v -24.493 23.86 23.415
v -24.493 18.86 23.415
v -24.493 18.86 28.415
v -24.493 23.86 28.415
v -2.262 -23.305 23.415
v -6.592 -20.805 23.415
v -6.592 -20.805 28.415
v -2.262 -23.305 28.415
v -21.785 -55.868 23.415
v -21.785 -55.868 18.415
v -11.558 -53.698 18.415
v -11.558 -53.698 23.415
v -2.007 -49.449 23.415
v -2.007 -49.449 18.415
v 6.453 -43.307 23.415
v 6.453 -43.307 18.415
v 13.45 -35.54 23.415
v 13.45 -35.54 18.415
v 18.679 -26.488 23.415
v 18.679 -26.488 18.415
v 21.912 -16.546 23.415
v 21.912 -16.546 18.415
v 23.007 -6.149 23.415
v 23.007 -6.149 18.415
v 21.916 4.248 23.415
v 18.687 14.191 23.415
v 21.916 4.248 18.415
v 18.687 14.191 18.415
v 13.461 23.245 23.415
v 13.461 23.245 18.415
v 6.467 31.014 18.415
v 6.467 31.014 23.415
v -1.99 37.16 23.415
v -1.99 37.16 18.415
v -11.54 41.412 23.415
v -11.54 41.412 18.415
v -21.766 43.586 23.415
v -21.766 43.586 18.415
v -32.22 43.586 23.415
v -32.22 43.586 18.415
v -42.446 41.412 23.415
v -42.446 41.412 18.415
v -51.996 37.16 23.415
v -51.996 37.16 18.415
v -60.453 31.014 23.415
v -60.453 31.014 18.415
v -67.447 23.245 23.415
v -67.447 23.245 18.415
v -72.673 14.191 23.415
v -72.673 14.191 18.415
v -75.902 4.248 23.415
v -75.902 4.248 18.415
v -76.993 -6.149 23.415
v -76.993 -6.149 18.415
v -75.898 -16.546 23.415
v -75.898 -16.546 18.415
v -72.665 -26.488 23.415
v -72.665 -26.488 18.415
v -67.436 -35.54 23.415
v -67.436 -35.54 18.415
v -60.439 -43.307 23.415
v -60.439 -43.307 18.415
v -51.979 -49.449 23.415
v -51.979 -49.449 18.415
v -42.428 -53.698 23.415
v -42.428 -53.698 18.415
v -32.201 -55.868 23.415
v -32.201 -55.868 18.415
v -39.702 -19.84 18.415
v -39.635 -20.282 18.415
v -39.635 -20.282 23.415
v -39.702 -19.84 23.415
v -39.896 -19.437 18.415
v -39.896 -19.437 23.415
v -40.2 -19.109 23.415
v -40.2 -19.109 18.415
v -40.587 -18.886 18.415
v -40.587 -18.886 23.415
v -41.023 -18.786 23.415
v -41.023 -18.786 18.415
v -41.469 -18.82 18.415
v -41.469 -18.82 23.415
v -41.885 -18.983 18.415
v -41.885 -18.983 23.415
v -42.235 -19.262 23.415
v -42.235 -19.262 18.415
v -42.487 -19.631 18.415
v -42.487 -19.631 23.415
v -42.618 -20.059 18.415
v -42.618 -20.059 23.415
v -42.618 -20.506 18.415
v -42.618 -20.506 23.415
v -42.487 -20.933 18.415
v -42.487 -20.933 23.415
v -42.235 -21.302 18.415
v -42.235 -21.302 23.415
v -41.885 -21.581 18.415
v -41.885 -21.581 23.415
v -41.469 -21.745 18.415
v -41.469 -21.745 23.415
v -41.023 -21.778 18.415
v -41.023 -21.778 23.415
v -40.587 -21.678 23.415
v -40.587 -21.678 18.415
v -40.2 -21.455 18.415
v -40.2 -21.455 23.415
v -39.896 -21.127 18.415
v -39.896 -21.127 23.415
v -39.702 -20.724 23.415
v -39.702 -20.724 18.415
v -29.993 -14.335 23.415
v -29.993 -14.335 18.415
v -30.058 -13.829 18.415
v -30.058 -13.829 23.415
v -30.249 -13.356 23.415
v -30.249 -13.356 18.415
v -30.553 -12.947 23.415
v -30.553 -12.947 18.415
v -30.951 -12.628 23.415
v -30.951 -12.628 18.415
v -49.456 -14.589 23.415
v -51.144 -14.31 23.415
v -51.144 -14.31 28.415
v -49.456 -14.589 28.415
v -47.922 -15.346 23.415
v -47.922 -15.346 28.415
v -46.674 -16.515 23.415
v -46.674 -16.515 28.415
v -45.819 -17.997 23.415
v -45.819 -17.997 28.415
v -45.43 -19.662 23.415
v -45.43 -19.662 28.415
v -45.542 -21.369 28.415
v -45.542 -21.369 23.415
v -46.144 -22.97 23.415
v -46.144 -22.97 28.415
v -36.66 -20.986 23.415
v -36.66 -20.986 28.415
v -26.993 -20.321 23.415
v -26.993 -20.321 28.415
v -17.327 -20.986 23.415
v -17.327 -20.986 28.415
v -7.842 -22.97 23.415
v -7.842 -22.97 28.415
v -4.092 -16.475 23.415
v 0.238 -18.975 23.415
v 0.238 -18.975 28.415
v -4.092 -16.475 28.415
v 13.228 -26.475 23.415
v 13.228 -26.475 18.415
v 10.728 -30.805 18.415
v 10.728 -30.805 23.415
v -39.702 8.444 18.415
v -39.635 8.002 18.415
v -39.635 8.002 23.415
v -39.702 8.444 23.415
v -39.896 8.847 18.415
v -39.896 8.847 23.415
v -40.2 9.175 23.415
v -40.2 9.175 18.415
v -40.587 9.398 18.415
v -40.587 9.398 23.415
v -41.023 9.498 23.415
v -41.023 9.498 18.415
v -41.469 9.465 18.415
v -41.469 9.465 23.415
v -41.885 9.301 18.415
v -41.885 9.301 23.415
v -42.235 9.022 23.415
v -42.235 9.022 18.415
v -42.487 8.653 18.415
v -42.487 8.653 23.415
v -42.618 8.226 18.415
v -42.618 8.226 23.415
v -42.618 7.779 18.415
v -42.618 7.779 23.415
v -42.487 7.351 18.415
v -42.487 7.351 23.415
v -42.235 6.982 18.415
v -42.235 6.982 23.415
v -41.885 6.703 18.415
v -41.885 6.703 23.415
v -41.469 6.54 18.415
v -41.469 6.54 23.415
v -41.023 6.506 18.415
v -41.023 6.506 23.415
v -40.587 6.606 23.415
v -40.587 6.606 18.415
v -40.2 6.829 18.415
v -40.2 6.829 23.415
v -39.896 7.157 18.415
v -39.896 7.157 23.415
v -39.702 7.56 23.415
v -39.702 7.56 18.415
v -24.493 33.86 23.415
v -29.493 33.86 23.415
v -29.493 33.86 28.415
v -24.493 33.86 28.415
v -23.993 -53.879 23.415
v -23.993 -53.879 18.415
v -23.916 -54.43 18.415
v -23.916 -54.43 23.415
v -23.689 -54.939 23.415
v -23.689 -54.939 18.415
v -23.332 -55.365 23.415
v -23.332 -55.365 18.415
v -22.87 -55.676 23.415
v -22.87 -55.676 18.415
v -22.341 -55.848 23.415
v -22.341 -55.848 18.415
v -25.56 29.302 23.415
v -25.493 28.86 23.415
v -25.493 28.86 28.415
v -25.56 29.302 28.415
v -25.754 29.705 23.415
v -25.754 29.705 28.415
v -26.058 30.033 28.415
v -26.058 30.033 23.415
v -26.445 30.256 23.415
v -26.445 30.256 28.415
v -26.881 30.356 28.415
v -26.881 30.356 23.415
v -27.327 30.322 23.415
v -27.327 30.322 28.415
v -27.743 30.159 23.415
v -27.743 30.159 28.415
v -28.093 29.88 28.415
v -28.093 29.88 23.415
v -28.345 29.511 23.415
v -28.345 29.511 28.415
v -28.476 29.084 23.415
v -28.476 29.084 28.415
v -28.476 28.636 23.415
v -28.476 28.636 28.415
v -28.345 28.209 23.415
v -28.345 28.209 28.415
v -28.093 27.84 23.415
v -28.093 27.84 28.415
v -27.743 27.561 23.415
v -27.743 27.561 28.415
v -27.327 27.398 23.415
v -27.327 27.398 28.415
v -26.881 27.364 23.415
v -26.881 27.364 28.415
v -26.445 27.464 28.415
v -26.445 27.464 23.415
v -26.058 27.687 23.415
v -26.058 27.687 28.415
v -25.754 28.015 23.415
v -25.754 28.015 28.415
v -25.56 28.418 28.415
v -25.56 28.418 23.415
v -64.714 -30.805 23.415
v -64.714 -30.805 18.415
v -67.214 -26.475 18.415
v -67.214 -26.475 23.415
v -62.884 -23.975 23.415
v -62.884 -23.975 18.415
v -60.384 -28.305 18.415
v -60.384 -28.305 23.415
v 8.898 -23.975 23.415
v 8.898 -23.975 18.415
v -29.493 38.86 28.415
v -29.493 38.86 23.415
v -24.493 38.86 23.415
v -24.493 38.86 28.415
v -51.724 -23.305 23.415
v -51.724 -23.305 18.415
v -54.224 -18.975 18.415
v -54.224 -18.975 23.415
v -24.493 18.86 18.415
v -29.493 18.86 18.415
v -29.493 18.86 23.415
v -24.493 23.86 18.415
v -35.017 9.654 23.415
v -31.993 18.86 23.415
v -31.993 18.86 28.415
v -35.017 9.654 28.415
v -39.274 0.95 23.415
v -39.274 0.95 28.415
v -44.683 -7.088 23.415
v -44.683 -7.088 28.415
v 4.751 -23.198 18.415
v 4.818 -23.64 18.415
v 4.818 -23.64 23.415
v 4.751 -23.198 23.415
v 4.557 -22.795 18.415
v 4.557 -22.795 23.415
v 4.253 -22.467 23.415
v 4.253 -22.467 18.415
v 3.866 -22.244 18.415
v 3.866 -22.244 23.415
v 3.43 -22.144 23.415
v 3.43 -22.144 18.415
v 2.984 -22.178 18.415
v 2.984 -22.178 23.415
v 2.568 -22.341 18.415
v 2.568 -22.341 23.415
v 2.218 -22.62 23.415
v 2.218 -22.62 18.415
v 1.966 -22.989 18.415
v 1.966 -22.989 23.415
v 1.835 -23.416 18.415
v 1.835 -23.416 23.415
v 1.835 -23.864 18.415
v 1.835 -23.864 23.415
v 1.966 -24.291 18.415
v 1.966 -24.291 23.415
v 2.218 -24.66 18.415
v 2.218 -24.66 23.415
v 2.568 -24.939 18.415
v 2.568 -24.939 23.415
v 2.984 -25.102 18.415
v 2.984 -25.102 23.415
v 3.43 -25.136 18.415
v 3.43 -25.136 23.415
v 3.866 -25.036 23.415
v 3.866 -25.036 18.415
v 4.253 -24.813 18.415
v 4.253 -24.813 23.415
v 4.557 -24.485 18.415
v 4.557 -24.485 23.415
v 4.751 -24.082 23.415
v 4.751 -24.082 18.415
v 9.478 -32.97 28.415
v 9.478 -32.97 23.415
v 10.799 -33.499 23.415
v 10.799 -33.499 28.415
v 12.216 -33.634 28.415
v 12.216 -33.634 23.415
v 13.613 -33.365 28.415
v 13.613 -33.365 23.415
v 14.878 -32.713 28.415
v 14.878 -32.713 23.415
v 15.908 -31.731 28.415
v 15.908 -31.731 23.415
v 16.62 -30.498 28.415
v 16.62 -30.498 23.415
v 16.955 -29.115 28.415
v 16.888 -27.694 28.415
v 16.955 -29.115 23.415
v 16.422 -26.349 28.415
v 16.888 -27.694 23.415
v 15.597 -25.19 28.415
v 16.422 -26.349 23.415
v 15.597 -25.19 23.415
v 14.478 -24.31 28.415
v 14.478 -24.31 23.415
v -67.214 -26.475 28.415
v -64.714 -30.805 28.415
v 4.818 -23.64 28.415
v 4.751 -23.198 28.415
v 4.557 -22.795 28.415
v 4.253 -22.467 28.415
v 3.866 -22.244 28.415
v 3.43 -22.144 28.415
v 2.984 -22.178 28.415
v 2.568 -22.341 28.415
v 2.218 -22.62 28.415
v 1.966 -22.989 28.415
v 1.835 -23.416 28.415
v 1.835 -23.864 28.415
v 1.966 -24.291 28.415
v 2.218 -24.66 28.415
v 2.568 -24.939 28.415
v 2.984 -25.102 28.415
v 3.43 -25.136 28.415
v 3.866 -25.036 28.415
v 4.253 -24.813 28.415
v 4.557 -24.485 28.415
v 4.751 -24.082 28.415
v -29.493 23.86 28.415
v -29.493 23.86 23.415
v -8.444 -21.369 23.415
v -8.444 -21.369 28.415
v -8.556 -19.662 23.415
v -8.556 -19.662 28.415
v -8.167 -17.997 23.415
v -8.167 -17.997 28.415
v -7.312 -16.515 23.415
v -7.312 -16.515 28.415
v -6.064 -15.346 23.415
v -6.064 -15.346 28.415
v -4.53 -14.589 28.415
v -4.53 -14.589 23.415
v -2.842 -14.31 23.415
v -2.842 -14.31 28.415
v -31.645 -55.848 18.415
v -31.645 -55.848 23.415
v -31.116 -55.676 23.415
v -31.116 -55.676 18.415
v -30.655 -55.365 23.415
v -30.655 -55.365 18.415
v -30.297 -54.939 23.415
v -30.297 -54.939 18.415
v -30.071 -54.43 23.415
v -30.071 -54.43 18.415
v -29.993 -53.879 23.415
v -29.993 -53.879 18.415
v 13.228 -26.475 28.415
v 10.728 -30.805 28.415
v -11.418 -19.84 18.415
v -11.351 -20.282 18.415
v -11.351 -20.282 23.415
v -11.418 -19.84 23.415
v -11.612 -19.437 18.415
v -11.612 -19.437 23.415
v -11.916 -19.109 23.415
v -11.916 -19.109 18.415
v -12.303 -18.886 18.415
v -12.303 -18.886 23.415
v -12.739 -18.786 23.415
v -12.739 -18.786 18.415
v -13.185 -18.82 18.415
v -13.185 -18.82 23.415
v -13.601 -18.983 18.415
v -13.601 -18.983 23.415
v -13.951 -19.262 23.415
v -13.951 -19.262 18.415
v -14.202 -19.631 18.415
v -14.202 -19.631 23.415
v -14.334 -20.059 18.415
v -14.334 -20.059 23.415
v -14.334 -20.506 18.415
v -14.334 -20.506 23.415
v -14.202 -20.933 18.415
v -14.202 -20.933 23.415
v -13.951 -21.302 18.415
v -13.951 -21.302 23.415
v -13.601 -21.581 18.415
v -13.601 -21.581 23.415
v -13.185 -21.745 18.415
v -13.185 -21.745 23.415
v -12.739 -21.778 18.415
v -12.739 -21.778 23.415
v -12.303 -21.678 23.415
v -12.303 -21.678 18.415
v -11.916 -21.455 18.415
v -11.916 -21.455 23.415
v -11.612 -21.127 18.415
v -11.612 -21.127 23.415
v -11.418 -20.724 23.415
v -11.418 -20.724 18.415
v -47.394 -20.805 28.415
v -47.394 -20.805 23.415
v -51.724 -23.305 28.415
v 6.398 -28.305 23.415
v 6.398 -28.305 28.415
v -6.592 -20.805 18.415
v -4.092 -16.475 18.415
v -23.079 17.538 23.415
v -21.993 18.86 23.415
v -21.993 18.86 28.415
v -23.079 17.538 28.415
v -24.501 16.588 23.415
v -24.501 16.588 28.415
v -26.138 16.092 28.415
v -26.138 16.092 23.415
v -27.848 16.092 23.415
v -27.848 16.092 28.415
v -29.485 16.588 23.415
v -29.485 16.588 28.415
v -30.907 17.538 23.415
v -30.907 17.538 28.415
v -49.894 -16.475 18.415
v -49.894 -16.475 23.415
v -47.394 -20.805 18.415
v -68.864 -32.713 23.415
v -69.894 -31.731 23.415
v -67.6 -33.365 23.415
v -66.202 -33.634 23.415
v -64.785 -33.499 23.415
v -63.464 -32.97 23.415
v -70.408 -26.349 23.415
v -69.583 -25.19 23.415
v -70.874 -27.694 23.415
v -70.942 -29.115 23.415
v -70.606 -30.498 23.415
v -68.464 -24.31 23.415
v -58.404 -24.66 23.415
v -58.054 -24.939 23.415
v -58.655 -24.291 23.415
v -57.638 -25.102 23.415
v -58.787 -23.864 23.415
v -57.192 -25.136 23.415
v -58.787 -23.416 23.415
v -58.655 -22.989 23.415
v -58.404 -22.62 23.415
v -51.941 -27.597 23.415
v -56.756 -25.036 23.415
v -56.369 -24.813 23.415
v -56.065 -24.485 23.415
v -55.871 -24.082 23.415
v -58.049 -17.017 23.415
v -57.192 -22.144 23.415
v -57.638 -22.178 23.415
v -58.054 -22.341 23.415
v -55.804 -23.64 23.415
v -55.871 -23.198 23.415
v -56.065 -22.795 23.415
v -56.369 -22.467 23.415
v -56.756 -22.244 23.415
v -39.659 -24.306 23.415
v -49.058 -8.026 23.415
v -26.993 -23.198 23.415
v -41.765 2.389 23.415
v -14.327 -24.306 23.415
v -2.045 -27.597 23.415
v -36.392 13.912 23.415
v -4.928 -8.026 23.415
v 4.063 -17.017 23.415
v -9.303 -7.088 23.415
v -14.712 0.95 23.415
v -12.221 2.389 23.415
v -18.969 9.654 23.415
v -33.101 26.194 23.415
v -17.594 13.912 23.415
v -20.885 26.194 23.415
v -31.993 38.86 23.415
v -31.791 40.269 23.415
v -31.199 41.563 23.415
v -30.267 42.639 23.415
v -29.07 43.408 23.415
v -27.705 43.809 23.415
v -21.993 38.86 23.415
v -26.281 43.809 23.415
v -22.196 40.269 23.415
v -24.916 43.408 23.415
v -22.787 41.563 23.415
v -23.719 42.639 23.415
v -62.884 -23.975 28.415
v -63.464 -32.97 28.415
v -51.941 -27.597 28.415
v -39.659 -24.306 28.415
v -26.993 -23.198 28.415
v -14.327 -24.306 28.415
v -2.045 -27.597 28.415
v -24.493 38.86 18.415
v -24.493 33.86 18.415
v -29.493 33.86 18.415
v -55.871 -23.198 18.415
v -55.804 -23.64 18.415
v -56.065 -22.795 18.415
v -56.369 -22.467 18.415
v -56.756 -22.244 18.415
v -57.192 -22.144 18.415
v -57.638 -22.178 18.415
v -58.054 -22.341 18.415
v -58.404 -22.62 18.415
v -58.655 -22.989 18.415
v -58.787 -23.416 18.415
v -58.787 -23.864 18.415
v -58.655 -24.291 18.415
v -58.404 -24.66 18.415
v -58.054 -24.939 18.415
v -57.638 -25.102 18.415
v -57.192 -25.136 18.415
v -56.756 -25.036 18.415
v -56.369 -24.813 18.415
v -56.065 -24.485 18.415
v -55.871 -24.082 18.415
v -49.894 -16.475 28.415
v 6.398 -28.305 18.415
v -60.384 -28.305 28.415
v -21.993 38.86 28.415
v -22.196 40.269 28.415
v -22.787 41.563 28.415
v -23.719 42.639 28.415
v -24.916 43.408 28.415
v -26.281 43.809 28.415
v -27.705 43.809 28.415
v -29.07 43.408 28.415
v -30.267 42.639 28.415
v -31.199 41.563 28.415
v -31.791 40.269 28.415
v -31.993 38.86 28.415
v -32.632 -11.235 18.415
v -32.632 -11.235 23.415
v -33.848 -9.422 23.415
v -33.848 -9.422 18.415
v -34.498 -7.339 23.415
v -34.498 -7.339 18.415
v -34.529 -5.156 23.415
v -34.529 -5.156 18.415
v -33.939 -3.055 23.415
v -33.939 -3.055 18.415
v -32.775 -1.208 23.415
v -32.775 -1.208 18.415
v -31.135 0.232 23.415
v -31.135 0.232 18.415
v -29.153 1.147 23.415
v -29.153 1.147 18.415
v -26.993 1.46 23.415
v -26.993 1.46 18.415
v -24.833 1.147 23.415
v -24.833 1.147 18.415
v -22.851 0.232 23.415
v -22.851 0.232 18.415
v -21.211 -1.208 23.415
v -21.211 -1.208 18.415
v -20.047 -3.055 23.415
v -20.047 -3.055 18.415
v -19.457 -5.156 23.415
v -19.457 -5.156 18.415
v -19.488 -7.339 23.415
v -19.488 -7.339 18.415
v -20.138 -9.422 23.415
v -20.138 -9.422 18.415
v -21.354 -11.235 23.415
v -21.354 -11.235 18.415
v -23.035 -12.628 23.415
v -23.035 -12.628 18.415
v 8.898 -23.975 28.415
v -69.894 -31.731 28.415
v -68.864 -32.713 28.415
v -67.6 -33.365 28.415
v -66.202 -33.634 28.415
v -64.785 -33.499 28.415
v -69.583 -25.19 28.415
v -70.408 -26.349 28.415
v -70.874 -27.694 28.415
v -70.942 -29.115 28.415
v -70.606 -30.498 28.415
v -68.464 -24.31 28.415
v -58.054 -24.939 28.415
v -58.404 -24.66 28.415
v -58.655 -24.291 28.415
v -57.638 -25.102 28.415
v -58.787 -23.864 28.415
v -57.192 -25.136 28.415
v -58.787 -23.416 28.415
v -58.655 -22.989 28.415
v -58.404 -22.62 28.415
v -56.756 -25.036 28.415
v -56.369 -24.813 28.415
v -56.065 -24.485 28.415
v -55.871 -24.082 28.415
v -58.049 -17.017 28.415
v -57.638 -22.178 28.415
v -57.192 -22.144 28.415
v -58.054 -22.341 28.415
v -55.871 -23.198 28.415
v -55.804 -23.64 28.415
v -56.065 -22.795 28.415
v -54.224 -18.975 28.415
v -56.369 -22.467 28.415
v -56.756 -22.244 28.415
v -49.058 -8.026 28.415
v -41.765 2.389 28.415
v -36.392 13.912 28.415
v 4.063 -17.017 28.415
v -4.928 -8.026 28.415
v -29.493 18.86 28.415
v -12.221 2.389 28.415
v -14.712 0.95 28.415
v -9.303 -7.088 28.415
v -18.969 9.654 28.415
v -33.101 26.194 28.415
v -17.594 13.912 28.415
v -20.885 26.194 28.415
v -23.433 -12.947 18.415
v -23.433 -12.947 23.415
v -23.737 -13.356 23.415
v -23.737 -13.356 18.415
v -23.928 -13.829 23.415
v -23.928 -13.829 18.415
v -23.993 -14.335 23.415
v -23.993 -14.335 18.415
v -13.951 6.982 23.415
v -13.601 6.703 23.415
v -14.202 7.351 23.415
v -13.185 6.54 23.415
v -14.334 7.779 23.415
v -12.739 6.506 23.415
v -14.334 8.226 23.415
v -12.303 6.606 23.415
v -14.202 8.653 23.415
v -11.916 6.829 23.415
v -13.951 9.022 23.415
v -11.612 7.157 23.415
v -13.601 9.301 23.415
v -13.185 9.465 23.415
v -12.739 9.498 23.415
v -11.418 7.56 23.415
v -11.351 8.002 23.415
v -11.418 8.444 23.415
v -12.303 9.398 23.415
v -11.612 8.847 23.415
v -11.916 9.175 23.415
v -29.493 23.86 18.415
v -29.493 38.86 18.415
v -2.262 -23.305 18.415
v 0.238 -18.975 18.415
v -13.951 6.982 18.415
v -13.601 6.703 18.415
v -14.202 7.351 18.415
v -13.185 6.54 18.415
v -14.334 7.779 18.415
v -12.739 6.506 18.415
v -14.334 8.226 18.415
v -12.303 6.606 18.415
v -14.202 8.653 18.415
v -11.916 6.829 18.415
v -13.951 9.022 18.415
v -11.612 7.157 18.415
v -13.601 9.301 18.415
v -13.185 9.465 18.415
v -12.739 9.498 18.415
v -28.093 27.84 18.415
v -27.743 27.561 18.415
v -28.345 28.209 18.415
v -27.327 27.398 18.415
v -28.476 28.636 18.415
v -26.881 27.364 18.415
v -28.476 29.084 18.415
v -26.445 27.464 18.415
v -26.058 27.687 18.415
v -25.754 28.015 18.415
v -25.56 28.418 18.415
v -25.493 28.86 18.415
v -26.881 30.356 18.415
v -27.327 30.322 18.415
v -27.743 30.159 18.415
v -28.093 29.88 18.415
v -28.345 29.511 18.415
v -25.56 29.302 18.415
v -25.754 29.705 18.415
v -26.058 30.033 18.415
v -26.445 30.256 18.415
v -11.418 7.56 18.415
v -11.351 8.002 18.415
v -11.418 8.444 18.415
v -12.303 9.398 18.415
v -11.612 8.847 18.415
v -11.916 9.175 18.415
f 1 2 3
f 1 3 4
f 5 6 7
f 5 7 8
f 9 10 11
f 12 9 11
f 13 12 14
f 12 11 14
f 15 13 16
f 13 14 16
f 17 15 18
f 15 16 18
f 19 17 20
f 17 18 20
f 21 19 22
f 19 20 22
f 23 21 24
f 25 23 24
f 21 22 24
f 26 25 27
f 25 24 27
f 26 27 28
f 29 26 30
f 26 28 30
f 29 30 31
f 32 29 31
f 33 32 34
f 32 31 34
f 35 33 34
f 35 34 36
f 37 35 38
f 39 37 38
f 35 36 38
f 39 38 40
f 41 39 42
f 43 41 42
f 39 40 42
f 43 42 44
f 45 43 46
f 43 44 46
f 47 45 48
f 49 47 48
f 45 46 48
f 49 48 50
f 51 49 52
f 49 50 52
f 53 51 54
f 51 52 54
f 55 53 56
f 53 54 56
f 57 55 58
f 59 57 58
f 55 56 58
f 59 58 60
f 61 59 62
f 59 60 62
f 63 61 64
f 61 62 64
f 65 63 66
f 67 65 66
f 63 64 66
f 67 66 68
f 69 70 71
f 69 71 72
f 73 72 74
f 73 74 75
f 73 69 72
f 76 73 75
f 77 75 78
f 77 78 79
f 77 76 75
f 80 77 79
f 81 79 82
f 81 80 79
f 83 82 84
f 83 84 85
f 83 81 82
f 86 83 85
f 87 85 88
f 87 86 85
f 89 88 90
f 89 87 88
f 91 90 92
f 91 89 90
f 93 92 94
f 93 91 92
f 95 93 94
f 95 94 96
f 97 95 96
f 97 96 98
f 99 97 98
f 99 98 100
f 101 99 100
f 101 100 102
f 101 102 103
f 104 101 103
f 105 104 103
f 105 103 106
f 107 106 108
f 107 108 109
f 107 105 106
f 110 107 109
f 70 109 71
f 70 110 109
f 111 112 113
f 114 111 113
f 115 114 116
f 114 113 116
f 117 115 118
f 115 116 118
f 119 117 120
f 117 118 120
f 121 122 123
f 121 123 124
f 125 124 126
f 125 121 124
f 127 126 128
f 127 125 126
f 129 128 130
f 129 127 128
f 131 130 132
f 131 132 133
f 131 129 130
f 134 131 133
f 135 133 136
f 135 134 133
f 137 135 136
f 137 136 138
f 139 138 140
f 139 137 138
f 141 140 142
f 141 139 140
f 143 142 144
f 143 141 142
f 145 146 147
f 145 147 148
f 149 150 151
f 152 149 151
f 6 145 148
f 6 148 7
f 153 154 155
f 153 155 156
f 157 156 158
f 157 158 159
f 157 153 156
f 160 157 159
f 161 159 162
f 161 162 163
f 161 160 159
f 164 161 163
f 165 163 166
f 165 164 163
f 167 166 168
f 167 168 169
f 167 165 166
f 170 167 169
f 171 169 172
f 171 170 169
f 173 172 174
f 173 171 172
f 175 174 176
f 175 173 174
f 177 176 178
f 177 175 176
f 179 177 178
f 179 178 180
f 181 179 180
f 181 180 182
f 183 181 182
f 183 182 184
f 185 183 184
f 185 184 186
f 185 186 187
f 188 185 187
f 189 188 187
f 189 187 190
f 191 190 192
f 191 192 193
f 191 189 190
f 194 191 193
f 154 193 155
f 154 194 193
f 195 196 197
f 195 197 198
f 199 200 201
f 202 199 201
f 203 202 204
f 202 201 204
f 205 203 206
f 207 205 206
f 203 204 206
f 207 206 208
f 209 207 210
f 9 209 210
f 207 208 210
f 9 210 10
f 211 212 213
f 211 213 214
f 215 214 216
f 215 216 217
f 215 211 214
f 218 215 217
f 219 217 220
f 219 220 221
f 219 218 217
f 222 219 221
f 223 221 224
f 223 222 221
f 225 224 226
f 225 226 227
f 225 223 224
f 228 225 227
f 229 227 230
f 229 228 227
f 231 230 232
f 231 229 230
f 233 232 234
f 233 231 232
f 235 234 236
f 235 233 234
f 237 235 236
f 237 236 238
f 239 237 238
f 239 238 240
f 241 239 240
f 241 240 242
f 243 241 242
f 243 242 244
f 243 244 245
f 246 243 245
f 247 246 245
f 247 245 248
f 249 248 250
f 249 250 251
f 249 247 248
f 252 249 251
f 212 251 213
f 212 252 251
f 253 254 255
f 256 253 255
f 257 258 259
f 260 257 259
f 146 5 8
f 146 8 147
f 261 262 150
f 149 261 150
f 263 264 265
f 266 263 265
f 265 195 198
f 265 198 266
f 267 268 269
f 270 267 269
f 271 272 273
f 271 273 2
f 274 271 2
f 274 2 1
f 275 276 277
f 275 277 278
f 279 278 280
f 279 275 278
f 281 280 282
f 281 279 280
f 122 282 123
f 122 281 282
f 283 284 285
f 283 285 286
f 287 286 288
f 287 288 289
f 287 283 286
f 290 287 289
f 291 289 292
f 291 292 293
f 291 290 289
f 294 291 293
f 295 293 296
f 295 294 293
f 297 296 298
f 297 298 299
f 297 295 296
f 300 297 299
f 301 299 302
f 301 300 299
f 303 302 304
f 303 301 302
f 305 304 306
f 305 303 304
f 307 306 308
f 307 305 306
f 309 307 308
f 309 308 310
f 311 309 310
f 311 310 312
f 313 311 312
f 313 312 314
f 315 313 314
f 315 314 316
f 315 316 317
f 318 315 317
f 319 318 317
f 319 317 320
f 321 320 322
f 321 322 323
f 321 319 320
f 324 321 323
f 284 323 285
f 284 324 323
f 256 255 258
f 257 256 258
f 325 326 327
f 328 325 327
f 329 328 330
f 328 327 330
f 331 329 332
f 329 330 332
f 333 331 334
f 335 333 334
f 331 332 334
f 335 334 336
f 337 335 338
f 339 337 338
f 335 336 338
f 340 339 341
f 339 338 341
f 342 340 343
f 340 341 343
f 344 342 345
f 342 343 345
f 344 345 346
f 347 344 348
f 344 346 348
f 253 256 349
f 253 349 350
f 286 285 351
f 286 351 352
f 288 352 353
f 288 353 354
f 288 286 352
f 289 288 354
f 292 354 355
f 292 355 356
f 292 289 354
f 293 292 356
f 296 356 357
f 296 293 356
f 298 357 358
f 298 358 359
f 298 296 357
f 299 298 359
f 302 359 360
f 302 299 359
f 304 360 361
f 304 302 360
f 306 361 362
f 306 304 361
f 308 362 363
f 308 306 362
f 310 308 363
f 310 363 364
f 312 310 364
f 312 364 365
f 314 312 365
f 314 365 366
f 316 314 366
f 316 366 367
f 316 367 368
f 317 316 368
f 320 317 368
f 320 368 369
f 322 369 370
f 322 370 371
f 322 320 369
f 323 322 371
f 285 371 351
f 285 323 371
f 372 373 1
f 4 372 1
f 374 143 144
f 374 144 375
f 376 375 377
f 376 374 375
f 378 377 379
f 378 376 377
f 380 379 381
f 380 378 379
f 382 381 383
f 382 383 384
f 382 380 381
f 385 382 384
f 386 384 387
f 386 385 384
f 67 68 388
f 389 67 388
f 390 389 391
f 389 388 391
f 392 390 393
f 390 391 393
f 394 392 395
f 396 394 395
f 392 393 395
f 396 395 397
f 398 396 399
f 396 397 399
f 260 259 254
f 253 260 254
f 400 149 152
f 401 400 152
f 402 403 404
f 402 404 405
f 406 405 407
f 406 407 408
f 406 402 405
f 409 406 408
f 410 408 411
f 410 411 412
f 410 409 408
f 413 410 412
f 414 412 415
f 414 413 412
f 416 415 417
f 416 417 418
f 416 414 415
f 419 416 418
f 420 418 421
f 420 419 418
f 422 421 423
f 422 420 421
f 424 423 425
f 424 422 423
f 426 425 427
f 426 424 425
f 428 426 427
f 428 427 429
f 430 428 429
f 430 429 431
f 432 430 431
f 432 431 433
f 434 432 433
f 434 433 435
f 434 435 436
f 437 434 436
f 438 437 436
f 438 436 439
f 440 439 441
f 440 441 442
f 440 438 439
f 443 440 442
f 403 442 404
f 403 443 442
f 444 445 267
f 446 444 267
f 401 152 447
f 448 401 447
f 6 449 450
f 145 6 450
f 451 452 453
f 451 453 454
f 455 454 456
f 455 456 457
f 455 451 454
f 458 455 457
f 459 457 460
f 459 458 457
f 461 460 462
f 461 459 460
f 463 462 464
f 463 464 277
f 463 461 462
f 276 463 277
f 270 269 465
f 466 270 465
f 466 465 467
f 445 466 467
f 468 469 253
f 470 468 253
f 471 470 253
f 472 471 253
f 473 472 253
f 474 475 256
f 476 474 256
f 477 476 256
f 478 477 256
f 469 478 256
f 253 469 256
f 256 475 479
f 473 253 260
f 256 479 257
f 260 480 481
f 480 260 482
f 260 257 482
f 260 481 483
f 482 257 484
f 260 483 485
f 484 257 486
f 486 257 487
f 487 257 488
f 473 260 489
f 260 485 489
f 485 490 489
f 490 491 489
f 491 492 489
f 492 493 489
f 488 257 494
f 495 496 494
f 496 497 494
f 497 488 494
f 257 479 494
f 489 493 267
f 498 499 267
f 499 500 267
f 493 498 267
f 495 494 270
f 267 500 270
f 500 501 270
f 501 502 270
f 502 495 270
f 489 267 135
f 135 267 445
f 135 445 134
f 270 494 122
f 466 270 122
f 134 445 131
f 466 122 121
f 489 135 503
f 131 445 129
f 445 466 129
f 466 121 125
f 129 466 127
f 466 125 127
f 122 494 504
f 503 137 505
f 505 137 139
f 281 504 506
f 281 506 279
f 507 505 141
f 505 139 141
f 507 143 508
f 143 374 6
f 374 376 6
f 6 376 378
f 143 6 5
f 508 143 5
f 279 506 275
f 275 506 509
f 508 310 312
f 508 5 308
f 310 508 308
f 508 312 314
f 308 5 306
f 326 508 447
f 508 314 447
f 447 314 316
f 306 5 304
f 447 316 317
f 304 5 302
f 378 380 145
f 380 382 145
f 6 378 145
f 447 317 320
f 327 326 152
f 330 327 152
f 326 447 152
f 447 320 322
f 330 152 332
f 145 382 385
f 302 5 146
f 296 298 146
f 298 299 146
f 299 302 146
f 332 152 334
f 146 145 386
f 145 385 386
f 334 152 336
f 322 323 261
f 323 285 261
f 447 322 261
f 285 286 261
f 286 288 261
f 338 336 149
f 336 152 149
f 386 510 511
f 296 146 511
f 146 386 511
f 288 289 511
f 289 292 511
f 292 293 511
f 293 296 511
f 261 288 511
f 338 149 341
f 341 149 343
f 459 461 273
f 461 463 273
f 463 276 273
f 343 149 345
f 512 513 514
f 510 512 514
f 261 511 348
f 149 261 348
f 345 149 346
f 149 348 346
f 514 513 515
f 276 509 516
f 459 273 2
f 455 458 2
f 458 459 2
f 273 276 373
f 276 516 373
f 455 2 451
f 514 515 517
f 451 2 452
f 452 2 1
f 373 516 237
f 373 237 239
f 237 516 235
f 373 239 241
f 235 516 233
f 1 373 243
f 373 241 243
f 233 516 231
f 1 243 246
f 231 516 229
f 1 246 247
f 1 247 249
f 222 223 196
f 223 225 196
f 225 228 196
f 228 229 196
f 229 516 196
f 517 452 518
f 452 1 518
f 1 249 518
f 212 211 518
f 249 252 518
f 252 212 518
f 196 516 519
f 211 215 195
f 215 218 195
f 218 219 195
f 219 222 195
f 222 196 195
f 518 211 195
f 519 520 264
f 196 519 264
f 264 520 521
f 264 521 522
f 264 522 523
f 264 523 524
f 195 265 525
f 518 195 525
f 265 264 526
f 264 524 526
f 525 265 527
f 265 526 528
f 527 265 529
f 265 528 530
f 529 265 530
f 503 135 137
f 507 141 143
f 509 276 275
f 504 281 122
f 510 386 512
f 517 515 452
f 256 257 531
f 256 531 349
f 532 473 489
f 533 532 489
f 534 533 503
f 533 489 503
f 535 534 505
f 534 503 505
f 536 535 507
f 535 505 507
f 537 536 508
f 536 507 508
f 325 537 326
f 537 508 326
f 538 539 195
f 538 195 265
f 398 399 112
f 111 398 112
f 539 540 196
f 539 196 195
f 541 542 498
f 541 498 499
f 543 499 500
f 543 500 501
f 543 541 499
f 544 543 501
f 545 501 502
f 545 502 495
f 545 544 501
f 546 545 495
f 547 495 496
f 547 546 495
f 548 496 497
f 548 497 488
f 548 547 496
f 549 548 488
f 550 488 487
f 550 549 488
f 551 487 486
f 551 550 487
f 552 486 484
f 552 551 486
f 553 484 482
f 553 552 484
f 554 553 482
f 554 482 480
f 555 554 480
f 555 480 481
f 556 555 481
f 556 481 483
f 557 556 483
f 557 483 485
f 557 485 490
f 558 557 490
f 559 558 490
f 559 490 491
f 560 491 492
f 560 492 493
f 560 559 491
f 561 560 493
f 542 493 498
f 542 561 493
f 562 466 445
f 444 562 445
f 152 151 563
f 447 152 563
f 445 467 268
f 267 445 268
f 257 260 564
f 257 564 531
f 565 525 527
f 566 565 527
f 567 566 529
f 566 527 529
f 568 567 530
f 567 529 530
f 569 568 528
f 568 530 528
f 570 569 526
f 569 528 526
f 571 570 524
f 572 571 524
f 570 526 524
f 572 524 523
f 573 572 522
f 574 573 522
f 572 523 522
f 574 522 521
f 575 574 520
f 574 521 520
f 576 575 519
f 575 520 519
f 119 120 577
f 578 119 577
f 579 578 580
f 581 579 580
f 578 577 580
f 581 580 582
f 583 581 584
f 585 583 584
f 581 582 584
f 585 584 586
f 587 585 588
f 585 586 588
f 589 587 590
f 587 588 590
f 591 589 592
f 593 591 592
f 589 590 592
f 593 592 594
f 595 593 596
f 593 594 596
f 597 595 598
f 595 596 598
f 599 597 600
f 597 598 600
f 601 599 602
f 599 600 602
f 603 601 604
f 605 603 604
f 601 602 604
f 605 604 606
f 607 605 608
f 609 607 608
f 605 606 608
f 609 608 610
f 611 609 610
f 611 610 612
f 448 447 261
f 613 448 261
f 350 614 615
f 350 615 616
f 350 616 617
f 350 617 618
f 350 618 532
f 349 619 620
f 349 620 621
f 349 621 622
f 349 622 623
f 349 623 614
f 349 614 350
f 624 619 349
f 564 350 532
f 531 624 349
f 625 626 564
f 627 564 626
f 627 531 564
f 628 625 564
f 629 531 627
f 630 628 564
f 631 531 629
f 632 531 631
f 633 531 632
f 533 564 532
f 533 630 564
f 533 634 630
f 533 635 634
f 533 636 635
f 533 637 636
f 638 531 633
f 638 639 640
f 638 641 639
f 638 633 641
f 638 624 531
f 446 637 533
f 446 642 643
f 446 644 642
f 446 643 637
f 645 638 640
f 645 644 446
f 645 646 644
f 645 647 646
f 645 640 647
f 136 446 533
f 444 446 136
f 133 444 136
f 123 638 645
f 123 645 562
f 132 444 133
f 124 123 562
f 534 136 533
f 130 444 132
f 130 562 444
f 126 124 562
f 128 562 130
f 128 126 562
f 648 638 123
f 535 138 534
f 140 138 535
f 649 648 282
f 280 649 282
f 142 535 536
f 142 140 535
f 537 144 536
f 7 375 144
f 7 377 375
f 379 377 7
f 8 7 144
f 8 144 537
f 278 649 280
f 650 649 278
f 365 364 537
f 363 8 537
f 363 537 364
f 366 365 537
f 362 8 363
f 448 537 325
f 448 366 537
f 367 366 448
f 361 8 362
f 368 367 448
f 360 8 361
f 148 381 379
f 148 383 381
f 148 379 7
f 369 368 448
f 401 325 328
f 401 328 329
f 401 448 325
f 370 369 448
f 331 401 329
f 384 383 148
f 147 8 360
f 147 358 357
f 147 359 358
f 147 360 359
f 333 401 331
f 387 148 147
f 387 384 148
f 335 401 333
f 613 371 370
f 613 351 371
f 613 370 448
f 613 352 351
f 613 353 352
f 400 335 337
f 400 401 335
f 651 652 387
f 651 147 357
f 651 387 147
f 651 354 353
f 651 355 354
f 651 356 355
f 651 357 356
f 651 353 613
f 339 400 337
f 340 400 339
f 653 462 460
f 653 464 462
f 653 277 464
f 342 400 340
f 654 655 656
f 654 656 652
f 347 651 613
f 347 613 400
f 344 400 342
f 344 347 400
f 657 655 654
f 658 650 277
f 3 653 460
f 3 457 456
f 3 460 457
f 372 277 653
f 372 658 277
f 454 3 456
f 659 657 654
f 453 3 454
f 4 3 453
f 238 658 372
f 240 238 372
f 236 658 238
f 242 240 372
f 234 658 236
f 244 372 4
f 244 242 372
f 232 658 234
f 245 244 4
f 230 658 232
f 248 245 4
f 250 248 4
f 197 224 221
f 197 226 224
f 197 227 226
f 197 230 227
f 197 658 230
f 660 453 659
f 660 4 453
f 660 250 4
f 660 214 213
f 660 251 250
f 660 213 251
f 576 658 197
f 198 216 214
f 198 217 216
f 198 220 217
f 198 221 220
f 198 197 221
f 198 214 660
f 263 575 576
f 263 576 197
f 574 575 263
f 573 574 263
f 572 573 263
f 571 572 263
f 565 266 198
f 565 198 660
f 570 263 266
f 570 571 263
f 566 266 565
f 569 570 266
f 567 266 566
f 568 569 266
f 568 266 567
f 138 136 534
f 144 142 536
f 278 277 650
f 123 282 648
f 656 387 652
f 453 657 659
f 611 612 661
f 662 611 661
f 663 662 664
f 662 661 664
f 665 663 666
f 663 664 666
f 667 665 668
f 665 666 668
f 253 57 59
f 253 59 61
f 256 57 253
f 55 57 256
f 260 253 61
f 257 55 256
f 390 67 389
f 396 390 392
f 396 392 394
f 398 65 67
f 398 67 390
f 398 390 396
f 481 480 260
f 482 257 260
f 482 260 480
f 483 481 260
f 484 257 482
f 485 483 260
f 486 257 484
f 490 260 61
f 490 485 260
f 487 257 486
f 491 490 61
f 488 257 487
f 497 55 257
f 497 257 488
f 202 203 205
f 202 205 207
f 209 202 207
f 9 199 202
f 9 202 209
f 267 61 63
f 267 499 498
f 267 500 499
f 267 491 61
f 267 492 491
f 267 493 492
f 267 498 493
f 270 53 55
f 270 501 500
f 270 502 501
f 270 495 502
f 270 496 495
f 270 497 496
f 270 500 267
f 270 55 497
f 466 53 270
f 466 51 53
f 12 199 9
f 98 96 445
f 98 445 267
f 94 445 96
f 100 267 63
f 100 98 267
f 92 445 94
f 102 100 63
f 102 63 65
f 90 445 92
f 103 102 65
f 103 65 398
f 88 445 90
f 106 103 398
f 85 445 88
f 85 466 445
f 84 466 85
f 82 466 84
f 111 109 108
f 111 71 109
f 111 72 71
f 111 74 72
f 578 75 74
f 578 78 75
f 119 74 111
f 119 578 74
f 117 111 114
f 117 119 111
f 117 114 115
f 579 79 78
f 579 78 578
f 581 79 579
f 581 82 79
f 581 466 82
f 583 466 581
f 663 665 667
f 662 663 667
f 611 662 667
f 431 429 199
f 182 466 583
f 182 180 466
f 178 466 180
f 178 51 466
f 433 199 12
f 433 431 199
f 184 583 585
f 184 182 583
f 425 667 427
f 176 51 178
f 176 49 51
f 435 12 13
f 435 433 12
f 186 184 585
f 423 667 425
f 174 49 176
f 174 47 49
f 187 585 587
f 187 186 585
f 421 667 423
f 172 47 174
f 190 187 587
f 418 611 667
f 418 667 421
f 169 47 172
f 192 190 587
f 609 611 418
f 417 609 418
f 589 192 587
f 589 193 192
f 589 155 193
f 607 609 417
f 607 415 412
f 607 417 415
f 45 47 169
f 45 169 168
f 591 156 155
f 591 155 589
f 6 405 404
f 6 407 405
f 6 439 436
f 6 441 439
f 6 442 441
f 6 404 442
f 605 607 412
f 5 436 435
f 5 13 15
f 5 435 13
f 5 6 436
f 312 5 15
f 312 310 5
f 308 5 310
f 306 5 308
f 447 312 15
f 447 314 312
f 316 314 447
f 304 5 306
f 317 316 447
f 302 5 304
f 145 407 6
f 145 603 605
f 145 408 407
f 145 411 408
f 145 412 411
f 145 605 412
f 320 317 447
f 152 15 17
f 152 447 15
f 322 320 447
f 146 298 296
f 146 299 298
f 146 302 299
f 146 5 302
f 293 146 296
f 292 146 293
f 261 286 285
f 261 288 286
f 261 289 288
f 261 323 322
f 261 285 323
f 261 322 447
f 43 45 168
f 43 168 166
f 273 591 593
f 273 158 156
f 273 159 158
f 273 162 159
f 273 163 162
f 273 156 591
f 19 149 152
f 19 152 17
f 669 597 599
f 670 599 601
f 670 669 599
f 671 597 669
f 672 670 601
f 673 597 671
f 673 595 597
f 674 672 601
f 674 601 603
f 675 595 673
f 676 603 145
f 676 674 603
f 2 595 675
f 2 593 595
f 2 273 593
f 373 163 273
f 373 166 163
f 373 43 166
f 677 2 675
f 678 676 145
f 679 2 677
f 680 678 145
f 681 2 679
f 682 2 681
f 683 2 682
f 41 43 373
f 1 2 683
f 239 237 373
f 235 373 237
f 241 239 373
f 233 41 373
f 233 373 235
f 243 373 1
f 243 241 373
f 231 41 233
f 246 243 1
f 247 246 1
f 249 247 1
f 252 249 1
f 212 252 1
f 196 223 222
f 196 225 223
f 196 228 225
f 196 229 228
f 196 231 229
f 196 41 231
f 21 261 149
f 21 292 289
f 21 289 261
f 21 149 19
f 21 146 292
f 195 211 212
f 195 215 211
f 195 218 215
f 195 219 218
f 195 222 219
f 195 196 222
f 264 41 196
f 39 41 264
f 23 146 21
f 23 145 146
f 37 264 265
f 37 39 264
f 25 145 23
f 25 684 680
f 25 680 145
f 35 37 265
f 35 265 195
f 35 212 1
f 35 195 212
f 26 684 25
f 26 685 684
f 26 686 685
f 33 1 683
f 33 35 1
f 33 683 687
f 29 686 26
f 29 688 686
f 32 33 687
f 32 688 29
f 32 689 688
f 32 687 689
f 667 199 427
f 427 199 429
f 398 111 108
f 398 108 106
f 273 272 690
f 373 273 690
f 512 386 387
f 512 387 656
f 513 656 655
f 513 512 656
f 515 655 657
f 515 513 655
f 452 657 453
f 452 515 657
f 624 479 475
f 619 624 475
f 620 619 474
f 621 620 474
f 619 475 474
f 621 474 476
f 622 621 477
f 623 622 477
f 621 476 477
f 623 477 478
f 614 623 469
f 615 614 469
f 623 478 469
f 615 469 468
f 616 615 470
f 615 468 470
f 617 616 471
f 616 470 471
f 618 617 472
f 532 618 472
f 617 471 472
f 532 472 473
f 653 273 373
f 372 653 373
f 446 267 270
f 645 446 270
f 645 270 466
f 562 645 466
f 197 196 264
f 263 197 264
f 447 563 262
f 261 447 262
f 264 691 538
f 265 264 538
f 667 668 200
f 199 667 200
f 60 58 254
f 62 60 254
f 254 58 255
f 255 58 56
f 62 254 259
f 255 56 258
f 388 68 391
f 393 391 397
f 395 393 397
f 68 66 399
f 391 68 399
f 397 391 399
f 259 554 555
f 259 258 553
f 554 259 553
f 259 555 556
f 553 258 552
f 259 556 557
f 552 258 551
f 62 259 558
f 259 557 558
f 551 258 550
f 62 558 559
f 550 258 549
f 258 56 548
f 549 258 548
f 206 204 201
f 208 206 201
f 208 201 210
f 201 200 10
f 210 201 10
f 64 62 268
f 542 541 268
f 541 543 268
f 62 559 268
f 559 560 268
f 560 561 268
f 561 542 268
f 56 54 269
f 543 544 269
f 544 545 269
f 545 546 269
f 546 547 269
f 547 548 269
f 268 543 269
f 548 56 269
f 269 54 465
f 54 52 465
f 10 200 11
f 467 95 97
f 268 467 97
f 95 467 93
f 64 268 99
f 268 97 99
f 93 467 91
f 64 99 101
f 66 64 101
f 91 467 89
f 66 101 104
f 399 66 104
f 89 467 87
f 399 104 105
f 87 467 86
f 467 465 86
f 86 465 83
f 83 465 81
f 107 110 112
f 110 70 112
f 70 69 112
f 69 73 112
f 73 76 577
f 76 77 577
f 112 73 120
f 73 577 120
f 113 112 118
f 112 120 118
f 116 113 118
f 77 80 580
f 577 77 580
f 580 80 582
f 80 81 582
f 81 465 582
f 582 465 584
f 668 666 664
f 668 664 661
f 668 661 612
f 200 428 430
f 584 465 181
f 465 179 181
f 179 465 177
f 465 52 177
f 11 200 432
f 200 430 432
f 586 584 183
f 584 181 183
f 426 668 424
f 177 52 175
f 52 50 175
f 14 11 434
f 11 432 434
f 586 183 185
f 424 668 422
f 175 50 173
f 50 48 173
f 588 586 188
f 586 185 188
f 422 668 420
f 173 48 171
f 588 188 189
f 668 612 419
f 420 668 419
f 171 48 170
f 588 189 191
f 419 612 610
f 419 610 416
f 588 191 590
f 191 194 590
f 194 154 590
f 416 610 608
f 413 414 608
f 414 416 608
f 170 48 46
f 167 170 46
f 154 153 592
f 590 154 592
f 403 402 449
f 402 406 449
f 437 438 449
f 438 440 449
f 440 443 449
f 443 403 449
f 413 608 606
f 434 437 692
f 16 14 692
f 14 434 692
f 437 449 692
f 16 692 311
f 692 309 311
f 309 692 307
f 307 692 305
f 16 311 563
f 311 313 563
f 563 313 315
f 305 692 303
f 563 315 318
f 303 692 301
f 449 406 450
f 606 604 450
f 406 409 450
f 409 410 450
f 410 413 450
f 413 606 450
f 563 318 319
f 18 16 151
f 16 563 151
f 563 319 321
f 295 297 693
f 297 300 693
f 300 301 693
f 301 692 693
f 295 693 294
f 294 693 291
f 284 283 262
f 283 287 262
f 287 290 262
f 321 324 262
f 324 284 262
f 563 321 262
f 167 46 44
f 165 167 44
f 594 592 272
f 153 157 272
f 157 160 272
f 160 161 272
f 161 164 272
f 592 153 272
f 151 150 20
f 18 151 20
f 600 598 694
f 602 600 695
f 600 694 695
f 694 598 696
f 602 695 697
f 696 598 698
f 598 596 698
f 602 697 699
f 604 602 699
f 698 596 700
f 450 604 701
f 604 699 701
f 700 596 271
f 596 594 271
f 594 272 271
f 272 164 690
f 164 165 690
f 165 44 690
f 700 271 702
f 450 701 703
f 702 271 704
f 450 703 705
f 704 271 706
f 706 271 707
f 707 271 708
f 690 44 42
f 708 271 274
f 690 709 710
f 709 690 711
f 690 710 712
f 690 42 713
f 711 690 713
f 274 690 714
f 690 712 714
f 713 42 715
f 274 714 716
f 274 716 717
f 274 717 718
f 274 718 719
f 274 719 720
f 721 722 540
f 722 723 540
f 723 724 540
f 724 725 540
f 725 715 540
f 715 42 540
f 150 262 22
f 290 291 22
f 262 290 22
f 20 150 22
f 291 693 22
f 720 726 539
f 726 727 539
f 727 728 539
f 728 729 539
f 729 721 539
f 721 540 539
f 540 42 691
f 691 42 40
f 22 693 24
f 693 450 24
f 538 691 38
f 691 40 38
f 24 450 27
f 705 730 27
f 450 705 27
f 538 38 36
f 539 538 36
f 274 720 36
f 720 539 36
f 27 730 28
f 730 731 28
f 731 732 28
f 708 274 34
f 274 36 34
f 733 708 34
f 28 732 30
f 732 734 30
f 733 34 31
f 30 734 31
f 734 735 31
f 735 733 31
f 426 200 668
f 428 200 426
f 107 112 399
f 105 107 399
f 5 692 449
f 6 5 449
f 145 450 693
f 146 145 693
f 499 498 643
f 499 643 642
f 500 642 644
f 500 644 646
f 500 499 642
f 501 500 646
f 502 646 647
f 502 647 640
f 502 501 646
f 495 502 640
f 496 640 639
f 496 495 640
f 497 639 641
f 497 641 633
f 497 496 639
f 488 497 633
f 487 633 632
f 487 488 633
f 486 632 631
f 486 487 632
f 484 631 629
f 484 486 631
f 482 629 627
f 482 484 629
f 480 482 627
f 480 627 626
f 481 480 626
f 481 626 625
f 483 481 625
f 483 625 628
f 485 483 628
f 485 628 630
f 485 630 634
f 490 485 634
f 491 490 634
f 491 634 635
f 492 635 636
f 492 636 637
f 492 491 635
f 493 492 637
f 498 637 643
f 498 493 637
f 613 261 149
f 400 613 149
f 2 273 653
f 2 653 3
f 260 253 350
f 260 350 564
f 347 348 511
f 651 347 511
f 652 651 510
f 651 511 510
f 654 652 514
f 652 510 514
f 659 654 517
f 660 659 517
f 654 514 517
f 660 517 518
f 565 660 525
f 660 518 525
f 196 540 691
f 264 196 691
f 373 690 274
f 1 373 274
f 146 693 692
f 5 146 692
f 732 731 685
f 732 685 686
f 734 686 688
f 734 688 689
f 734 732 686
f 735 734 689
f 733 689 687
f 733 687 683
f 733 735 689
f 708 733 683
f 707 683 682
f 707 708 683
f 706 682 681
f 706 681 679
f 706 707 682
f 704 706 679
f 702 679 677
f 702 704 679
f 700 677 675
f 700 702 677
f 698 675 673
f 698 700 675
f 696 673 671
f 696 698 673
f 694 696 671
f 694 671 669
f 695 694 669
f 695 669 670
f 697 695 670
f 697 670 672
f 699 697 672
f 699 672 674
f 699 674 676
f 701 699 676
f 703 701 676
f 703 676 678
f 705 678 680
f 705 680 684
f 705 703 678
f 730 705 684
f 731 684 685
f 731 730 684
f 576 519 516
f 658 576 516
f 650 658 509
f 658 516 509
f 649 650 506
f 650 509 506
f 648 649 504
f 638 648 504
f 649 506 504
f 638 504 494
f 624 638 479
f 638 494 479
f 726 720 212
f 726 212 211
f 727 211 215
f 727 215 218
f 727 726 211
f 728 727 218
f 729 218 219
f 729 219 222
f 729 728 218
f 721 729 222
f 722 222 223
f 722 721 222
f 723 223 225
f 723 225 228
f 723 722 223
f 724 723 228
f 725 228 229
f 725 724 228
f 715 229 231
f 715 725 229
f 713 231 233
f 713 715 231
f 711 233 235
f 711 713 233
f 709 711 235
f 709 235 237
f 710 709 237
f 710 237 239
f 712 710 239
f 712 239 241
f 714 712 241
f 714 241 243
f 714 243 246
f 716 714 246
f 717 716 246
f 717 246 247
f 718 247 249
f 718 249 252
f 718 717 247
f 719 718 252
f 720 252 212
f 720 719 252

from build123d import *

# Parameters (mm, degrees)
BODY_MOVE_COPY2_START     = 18.4153099
BODY_MOVE_COPY2_OUTLINE_R = 1.5
BODY_MOVE_COPY2_OUTLINE_W = 5
BODY_MOVE_COPY2_OUTLINE_H = 5
BODY_MOVE_COPY2_DEPTH     = 5
SKETCH2_R                 = 1.5
SKETCH2_W                 = 5
SKETCH2_H                 = 5
BOSS_EXTRUDE1_DEPTH       = 5


# Read off the part's stored shape, not the designer's step: Body-Move/Copy2
with BuildPart() as part:
    # Body-Move/Copy2 outline → Body-Move/Copy2 (new body)
    with BuildSketch(Plane.XY.offset(BODY_MOVE_COPY2_START)):
        with BuildLine():
            ThreePointArc((-29.993059319, -14.335142591), (-30.249021858, -13.35619758), (-30.951392653, -12.62782582))
            ThreePointArc((-30.951392653, -12.62782582), (-26.993059319, 1.459977909), (-23.034725986, -12.62782582))
            ThreePointArc((-23.034725986, -12.62782582), (-23.737096781, -13.35619758), (-23.993059319, -14.335142591))
            Line((-23.993059319, -14.335142591), (-23.993059319, -53.87889514))
            ThreePointArc((-23.993059319, -53.87889514), (-23.331590853, -55.364941349), (-21.784725986, -55.868014851))
            ThreePointArc((-21.784725986, -55.868014851), (-26.993059319, 43.859977909), (-32.201392653, -55.868014851))
            ThreePointArc((-32.201392653, -55.868014851), (-30.654527786, -55.364941349), (-29.993059319, -53.87889514))
            Line((-29.993059319, -53.87889514), (-29.993059319, -14.335142591))
        make_face()
        Polygon((-67.21420249, -26.474958582), (-62.884075471, -23.974958582), (-60.384075471, -28.305085601), (-64.71420249, -30.805085601), align=None, mode=Mode.SUBTRACT)
        with Locations((-57.303948452, -23.640022091)):
            Circle(BODY_MOVE_COPY2_OUTLINE_R, mode=Mode.SUBTRACT)
        Polygon((-47.393694414, -20.805085601), (-51.723821433, -23.305085601), (-54.223821433, -18.974958582), (-49.893694414, -16.474958582), align=None, mode=Mode.SUBTRACT)
        with Locations((-41.135194943, -20.282157715)):
            Circle(BODY_MOVE_COPY2_OUTLINE_R, mode=Mode.SUBTRACT)
        with Locations((-12.850923696, -20.282157715)):
            Circle(BODY_MOVE_COPY2_OUTLINE_R, mode=Mode.SUBTRACT)
        Polygon((-4.092424225, -16.474958582), (0.237702794, -18.974958582), (-2.262297206, -23.305085601), (-6.592424225, -20.805085601), align=None, mode=Mode.SUBTRACT)
        Polygon((10.728083851, -30.805085601), (6.397956832, -28.305085601), (8.897956832, -23.974958582), (13.228083851, -26.474958582), align=None, mode=Mode.SUBTRACT)
        with Locations((3.317829813, -23.640022091)):
            Circle(BODY_MOVE_COPY2_OUTLINE_R, mode=Mode.SUBTRACT)
        with Locations((-41.135194943, 8.002113533)):
            Circle(BODY_MOVE_COPY2_OUTLINE_R, mode=Mode.SUBTRACT)
        with Locations((-12.850923696, 8.002113533)):
            Circle(BODY_MOVE_COPY2_OUTLINE_R, mode=Mode.SUBTRACT)
        with Locations((-26.993059319, 21.359977909)):
            Rectangle(BODY_MOVE_COPY2_OUTLINE_W, BODY_MOVE_COPY2_OUTLINE_H, mode=Mode.SUBTRACT)
        with Locations((-26.993059319, 28.859977909)):
            Circle(BODY_MOVE_COPY2_OUTLINE_R, mode=Mode.SUBTRACT)
        with Locations((-26.993059319, 36.359977909)):
            Rectangle(BODY_MOVE_COPY2_OUTLINE_W, BODY_MOVE_COPY2_OUTLINE_H, mode=Mode.SUBTRACT)
    extrude(amount=BODY_MOVE_COPY2_DEPTH)


with BuildPart() as body_2:
    # Sketch2 → Boss-Extrude1 (new body)
    with BuildSketch(Plane.XY.offset(23.4153099)):
        with BuildLine():
            ThreePointArc((-68.46420249, -24.309895072), (-70.294329509, -31.140022091), (-63.46420249, -32.97014911))
            ThreePointArc((-63.46420249, -32.97014911), (-26.993059319, -23.197735751), (9.478083851, -32.97014911))
            ThreePointArc((9.478083851, -32.97014911), (16.30821087, -31.140022091), (14.478083851, -24.309895072))
            ThreePointArc((14.478083851, -24.309895072), (-12.22064596, 2.388834739), (-21.993059319, 38.859977909))
            ThreePointArc((-21.993059319, 38.859977909), (-26.993059319, 43.859977909), (-31.993059319, 38.859977909))
            ThreePointArc((-31.993059319, 38.859977909), (-41.765472679, 2.388834739), (-68.46420249, -24.309895072))
        make_face()
        with Locations((-26.993059319, 28.859977909)):
            Circle(SKETCH2_R, mode=Mode.SUBTRACT)
        with Locations((3.317829813, -23.640022091)):
            Circle(SKETCH2_R, mode=Mode.SUBTRACT)
        with Locations((-57.303948452, -23.640022091)):
            Circle(SKETCH2_R, mode=Mode.SUBTRACT)
        with BuildLine():
            ThreePointArc((-46.143694414, -22.97014911), (-26.993059319, -20.320580734), (-7.842424225, -22.97014911))
            ThreePointArc((-7.842424225, -22.97014911), (-7.794100483, -17.224546144), (-2.842424225, -14.309895072))
            ThreePointArc((-2.842424225, -14.309895072), (-14.712335295, 0.95025723), (-21.993059319, 18.859977909))
            ThreePointArc((-21.993059319, 18.859977909), (-26.993059319, 16.029026014), (-31.993059319, 18.859977909))
            ThreePointArc((-31.993059319, 18.859977909), (-39.273783344, 0.95025723), (-51.143694414, -14.309895072))
            ThreePointArc((-51.143694414, -14.309895072), (-46.192018156, -17.224546144), (-46.143694414, -22.97014911))
        make_face(mode=Mode.SUBTRACT)
        with Locations((-26.993059319, 36.359977909)):
            Rectangle(SKETCH2_W, SKETCH2_H, mode=Mode.SUBTRACT)
        with Locations((-26.993059319, 21.359977909)):
            Rectangle(SKETCH2_W, SKETCH2_H, mode=Mode.SUBTRACT)
        Polygon((0.237702794, -18.974958582), (-4.092424225, -16.474958582), (-6.592424225, -20.805085601), (-2.262297206, -23.305085601), align=None, mode=Mode.SUBTRACT)
        Polygon((8.897956832, -23.974958582), (13.228083851, -26.474958582), (10.728083851, -30.805085601), (6.397956832, -28.305085601), align=None, mode=Mode.SUBTRACT)
        Polygon((-62.884075471, -23.974958582), (-67.21420249, -26.474958582), (-64.71420249, -30.805085601), (-60.384075471, -28.305085601), align=None, mode=Mode.SUBTRACT)
        Polygon((-54.223821433, -18.974958582), (-49.893694414, -16.474958582), (-47.393694414, -20.805085601), (-51.723821433, -23.305085601), align=None, mode=Mode.SUBTRACT)
    extrude(amount=BOSS_EXTRUDE1_DEPTH)


solid = Compound([part.part, body_2.part])
